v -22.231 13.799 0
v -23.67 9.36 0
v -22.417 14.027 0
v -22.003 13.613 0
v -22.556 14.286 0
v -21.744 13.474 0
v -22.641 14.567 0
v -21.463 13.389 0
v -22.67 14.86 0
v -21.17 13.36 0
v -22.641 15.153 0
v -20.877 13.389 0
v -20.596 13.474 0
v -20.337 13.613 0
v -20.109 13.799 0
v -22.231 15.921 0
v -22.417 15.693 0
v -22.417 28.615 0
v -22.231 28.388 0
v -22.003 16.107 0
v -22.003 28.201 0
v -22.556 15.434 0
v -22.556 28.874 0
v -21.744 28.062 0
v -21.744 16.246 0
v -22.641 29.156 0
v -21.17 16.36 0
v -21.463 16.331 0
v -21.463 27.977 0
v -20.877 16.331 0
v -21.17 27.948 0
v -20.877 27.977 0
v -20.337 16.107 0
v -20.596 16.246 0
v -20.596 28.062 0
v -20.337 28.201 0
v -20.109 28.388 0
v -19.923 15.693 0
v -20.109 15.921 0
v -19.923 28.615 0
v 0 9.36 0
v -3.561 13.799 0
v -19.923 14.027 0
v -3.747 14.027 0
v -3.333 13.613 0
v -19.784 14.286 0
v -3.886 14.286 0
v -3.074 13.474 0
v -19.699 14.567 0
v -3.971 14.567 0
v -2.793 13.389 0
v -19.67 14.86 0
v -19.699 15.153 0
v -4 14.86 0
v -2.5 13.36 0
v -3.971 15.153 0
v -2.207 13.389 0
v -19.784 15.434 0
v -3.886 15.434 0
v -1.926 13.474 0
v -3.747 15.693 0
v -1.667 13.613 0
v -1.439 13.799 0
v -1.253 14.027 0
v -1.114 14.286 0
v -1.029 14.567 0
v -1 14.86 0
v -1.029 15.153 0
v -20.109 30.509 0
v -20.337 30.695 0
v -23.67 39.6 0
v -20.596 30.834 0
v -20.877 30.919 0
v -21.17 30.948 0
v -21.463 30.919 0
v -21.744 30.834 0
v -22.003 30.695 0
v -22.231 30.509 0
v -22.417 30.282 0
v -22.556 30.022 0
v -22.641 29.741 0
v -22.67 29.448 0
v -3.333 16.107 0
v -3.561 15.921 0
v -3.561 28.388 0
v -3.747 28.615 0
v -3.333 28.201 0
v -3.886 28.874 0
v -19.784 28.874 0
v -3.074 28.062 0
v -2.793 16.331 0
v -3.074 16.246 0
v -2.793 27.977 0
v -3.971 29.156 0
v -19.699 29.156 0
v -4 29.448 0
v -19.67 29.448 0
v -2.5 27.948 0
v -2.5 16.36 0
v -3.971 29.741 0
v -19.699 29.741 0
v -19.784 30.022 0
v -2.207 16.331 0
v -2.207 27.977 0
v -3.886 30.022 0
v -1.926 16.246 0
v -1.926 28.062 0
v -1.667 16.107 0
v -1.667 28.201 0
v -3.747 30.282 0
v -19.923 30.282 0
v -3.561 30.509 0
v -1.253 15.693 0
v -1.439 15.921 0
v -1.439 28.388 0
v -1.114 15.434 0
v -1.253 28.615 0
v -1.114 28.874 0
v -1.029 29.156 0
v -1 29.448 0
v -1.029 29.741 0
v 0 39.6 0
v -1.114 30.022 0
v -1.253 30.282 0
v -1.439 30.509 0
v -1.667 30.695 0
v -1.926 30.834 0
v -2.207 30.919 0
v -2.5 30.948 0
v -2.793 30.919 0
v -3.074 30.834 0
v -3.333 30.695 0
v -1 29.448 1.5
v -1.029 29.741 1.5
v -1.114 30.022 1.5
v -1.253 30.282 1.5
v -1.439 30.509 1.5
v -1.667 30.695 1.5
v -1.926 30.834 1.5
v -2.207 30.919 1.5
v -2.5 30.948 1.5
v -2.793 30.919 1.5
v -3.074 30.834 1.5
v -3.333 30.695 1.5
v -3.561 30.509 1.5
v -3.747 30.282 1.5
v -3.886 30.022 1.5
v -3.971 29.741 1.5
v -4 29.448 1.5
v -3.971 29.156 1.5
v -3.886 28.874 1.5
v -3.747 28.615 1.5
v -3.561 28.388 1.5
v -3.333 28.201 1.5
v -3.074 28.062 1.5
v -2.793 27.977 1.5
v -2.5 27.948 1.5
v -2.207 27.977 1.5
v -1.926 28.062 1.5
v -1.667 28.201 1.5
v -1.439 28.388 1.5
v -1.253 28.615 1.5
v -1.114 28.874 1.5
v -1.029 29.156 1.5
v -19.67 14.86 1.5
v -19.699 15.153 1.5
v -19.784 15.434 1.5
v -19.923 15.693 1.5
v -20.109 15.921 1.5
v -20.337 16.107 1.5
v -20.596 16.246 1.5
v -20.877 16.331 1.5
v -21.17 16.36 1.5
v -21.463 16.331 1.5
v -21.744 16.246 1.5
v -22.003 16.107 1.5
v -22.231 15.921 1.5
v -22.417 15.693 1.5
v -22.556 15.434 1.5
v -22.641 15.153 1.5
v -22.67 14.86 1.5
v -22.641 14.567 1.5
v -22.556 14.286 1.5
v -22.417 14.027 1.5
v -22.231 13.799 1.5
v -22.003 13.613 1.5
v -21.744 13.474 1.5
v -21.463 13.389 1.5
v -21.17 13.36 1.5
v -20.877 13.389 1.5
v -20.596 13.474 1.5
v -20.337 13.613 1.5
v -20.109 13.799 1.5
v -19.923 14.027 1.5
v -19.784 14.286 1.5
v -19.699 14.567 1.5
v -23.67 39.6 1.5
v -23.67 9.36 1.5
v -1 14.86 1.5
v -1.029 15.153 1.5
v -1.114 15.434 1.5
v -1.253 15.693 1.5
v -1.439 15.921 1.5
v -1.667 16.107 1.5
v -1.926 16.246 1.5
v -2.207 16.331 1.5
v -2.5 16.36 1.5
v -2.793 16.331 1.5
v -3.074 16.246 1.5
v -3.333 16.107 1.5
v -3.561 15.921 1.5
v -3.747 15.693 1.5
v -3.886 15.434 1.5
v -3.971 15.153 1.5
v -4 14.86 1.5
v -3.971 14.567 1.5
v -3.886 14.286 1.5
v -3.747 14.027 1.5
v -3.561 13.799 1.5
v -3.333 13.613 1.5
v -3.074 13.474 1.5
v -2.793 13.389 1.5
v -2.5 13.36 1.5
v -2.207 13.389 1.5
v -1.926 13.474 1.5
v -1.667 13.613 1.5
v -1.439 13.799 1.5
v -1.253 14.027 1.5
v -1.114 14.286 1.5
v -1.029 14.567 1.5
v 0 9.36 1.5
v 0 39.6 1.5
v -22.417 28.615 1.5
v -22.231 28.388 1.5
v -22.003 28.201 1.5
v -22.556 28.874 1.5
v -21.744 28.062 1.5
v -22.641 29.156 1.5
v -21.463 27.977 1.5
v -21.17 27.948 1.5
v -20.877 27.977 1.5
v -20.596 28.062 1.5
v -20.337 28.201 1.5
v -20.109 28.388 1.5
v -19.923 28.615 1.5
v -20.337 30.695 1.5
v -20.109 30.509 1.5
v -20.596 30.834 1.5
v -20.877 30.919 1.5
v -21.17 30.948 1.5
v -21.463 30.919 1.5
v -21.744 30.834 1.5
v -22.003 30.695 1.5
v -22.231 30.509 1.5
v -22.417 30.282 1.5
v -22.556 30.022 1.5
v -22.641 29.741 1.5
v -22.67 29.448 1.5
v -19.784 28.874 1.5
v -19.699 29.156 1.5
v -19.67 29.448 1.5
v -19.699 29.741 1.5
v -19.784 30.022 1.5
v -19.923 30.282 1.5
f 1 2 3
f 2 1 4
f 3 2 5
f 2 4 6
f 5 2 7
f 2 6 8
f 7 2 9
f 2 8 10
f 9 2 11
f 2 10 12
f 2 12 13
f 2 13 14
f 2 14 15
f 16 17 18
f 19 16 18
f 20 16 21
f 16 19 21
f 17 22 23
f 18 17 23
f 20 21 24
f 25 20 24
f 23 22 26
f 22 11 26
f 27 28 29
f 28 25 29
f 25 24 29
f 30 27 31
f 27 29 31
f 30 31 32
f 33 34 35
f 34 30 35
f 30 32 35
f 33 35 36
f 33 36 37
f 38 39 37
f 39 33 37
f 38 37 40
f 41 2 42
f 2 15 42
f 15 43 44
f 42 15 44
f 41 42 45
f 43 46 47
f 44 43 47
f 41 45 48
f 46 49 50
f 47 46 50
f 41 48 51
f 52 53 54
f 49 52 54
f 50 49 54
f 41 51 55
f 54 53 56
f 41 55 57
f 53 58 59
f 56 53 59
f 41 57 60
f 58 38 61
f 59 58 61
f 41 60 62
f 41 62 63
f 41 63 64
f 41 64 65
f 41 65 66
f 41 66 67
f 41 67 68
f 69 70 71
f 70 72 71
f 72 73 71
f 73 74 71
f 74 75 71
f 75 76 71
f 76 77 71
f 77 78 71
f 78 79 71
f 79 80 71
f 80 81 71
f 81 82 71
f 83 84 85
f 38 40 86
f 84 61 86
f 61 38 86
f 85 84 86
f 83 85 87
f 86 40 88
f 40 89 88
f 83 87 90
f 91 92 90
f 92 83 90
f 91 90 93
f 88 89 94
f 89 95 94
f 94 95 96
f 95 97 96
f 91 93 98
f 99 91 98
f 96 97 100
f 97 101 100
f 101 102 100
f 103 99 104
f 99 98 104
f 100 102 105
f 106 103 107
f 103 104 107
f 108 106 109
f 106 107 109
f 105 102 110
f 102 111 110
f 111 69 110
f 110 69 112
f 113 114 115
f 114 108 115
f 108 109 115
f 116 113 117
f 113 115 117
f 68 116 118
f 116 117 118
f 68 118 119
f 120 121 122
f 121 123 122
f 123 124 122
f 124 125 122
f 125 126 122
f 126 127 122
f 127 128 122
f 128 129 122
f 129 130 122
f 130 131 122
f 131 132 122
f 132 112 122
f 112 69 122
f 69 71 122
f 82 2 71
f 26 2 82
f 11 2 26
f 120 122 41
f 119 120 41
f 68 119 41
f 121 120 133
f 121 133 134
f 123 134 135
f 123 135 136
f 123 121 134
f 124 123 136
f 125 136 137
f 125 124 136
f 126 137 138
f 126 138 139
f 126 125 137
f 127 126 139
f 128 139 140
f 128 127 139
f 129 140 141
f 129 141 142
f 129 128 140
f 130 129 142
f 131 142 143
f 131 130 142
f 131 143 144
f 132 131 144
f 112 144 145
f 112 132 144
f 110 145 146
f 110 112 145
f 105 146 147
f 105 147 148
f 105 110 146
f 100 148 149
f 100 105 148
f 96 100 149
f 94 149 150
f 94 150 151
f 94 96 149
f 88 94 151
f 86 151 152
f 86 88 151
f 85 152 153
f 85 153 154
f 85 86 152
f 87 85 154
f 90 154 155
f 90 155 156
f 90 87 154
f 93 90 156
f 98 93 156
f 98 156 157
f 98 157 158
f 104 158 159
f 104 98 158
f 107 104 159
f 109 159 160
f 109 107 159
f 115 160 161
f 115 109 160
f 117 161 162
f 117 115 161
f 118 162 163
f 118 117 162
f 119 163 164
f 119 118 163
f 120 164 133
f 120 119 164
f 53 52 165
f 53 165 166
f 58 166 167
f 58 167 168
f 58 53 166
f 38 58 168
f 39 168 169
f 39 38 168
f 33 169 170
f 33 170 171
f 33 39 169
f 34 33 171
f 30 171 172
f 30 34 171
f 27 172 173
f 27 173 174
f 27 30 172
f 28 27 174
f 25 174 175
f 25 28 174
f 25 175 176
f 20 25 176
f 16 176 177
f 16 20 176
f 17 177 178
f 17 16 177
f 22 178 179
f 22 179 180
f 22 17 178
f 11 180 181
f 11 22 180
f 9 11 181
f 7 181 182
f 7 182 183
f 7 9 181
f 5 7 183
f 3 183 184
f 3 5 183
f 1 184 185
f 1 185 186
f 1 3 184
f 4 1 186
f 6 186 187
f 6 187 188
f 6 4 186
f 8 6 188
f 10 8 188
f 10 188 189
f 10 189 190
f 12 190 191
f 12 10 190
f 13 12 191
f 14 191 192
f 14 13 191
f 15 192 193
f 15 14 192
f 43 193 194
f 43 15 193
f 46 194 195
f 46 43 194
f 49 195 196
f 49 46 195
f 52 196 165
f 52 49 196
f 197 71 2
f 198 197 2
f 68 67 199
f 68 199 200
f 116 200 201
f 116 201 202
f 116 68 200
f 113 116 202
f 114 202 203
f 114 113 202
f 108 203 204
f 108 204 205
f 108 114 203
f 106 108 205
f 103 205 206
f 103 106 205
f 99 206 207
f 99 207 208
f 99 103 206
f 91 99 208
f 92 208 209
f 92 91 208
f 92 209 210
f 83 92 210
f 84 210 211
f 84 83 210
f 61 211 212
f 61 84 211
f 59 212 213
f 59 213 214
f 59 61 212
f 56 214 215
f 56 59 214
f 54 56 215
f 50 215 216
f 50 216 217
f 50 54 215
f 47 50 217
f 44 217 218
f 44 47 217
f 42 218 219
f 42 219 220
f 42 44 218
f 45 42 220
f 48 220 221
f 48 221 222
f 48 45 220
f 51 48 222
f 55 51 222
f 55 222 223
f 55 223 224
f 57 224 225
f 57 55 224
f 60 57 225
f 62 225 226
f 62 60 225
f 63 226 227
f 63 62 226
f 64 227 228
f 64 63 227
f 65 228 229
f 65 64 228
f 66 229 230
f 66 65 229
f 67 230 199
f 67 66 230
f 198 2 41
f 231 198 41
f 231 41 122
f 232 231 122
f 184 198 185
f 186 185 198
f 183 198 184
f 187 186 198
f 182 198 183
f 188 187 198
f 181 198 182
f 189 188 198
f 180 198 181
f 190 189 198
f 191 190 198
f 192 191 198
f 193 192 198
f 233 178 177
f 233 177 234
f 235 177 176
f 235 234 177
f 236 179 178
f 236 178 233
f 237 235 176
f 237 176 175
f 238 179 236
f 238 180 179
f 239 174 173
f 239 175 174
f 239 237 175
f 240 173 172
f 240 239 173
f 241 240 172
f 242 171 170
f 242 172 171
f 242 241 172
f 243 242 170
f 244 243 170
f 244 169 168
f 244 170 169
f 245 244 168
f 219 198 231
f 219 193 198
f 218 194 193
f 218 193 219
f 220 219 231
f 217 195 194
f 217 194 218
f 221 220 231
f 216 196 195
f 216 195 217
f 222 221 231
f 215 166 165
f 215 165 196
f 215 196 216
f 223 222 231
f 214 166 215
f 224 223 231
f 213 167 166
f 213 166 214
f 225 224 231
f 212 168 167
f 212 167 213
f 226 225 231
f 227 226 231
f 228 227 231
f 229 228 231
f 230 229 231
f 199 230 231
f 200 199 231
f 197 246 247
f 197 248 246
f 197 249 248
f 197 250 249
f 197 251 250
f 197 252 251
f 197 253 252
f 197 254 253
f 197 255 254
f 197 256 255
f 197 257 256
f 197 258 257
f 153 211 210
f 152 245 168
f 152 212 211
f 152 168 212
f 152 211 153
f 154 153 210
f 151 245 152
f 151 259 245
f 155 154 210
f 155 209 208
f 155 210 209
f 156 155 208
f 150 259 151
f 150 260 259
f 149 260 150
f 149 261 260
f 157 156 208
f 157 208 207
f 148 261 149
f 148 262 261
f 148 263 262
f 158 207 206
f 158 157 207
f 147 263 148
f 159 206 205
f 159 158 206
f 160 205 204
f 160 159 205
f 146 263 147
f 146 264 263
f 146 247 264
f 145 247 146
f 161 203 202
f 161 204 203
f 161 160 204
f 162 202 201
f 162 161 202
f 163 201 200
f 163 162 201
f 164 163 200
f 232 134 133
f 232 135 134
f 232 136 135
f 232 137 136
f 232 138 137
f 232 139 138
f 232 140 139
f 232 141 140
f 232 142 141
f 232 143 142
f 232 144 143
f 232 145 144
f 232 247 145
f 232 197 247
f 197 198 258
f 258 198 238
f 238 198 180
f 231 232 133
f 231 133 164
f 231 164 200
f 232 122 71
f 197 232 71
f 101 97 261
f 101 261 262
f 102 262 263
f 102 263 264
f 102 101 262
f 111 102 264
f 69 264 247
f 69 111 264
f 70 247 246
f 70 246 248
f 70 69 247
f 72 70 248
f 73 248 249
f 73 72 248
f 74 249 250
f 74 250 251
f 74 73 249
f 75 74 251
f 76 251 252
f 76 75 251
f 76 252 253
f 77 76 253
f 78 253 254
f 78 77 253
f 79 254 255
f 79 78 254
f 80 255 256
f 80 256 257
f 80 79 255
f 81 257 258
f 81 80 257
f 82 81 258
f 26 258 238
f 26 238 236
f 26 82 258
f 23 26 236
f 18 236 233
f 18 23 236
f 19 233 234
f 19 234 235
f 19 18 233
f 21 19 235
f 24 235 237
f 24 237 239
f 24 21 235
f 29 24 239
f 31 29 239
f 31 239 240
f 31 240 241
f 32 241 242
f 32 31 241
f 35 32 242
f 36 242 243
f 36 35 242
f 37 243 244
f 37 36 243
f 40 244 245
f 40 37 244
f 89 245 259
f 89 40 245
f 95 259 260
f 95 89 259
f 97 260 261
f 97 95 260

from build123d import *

# Parameters (mm, degrees)
F0_R     = 1.5
F1_DEPTH = 1.5


with BuildPart() as f1:
    # F0 (on Top) → F1 (new body)
    with BuildSketch(Plane.XY):
        Polygon((0, 39.600004), (-23.670001, 39.600004), (-23.670001, 14.86), (-23.670001, 13.36), (-23.670001, 9.36), (0, 9.36), align=None)
        with Locations((-21.170001, 14.86)):
            Circle(F0_R, mode=Mode.SUBTRACT)
        with Locations((-2.5, 14.86)):
            Circle(F0_R, mode=Mode.SUBTRACT)
        with Locations((-21.170001, 29.448288)):
            Circle(F0_R, mode=Mode.SUBTRACT)
        with Locations((-2.5, 29.448288)):
            Circle(F0_R, mode=Mode.SUBTRACT)
    extrude(amount=F1_DEPTH)


solid = f1.part
